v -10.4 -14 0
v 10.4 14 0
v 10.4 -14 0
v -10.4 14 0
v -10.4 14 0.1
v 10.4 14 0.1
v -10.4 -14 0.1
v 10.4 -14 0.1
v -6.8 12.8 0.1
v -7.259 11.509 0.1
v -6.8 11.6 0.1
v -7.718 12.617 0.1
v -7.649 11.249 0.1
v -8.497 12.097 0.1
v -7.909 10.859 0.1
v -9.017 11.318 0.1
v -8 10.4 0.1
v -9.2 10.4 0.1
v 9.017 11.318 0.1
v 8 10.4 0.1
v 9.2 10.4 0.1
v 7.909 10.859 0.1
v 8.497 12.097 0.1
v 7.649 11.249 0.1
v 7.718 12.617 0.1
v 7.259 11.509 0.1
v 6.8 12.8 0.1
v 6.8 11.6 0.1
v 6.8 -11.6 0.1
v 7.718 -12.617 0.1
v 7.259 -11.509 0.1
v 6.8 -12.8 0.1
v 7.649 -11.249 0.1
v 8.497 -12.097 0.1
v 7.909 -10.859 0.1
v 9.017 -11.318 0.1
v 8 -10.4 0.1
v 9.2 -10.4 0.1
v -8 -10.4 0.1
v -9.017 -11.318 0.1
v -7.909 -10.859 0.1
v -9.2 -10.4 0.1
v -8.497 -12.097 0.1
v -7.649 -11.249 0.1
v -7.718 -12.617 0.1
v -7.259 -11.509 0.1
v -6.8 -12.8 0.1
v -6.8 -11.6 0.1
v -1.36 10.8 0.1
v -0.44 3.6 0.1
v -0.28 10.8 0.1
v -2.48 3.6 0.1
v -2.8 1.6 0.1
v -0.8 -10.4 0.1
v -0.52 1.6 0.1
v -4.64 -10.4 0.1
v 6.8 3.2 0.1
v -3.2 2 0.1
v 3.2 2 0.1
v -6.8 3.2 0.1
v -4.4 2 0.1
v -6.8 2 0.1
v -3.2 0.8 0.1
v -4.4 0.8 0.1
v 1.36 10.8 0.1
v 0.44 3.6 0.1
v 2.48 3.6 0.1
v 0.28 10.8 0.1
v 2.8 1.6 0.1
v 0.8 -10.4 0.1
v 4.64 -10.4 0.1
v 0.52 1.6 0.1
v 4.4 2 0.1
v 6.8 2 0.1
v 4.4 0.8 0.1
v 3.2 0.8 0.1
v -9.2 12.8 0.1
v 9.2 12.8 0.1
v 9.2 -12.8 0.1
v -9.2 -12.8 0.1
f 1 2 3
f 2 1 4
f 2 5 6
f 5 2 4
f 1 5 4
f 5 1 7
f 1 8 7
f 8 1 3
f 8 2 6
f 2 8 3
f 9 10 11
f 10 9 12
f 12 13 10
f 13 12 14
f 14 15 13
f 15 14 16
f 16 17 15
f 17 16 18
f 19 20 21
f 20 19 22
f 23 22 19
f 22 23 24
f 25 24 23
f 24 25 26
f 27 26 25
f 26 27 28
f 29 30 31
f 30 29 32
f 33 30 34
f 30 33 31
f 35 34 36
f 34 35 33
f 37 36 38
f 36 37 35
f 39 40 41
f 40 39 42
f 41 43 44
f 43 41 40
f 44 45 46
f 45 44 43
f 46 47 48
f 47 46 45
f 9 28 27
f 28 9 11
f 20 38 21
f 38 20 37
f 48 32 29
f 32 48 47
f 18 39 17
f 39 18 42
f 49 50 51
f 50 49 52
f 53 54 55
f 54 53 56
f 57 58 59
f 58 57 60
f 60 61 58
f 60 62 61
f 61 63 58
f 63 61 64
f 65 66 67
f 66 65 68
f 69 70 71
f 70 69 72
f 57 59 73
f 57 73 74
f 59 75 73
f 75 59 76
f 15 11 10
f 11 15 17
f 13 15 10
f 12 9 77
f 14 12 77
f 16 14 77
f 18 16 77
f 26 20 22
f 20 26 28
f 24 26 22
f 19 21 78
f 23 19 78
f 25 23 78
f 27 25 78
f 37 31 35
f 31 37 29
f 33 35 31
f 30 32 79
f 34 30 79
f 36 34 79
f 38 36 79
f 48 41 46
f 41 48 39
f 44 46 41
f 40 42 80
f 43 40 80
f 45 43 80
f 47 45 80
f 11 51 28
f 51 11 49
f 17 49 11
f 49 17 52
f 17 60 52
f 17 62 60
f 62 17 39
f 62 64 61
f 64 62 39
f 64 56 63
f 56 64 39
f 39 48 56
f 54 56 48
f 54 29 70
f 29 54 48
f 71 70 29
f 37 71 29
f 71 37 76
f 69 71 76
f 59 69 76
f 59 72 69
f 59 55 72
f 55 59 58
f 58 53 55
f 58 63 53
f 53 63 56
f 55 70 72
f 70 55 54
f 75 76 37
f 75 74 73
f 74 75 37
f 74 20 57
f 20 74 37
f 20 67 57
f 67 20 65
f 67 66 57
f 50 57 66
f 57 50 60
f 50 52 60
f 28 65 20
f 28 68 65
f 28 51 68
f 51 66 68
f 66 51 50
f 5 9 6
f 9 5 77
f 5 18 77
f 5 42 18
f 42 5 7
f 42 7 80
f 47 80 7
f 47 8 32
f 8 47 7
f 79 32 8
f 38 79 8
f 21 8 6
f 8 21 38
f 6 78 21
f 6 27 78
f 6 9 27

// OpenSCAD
// file: ../p/1-4ndis.scad
use <../lib.scad>
function ldraw_lib__1_4ndis() = [
// 0 Disc Negative 0.25
// 0 Name: 1-4ndis.dat
// 0 Author: James Jessiman
// 0 !LDRAW_ORG Primitive UPDATE 2012-01
// 0 !LICENSE Licensed under CC BY 4.0 : see CAreadme.txt
// 
// 0 BFC CERTIFY CCW
  [0,"BFC","CERTIFY"],
  [0,"BFC","CCW"],
// 
// 0 !HISTORY 2002-03-23 [sbliss] Added BFC Statement
// 0 !HISTORY 2002-04-25 [PTadmin] Official Update 2002-02
// 0 !HISTORY 2007-06-22 [PTadmin] Header formatted for Contributor Agreement
// 0 !HISTORY 2008-07-01 [PTadmin] Official Update 2008-01
// 0 !HISTORY 2012-02-16 [Philo] Changed to CCW
// 0 !HISTORY 2012-03-30 [PTadmin] Official Update 2012-01
// 
// 
// 3 16 0.9239 0 0.3827 1 0 0 1 0 1
  [3,16,0.9239,0,0.3827,1,0,0,1,0,1],
// 3 16 0.7071 0 0.7071 0.9239 0 0.3827 1 0 1
  [3,16,0.7071,0,0.7071,0.9239,0,0.3827,1,0,1],
// 3 16 0.3827 0 0.9239 0.7071 0 0.7071 1 0 1
  [3,16,0.3827,0,0.9239,0.7071,0,0.7071,1,0,1],
// 3 16 0 0 1 0.3827 0 0.9239 1 0 1
  [3,16,0,0,1,0.3827,0,0.9239,1,0,1],
];
module ldraw_lib__1_4ndis(step=0, col=false, unit=2/5, alt=false, line=0.2, solid=!$preview)
    makepoly(ldraw_lib__1_4ndis(), step=step, col=col, unit=unit, alt=alt, line=line, solid=solid);
ldraw_lib__1_4ndis(line=0.2);
// file: ../p/1-4chrd.scad
use <../lib.scad>
function ldraw_lib__1_4chrd() = [
// 0 Chord 0.25
// 0 Name: 1-4chrd.dat
// 0 Author: Tony Hafner [hafhead]
// 0 !LDRAW_ORG Primitive UPDATE 2012-02
// 0 !LICENSE Licensed under CC BY 2.0 and CC BY 4.0 : see CAreadme.txt
// 
// 0 BFC CERTIFY CCW
  [0,"BFC","CERTIFY"],
  [0,"BFC","CCW"],
// 
// 0 !HISTORY 2004-04-22 [PTadmin] Official Update 2004-02
// 0 !HISTORY 2007-10-09 [PTadmin] Header formatted for Contributor Agreement
// 0 !HISTORY 2008-07-01 [PTadmin] Official Update 2008-01
// 0 !HISTORY 2012-08-02 [MMR1988] Re-creation with PrimGen2 and Rectifier
// 0 !HISTORY 2012-08-09 [PTadmin] Official Update 2012-02
// 
// 
// 4 16 0.9239 0 0.3827 0.3827 0 0.9239 0 0 1 1 0 0
  [4,16,0.9239,0,0.3827,0.3827,0,0.9239,0,0,1,1,0,0],
// 3 16 0.7071 0 0.7071 0.3827 0 0.9239 0.9239 0 0.3827
  [3,16,0.7071,0,0.7071,0.3827,0,0.9239,0.9239,0,0.3827],
];
module ldraw_lib__1_4chrd(step=0, col=false, unit=2/5, alt=false, line=0.2, solid=!$preview)
    makepoly(ldraw_lib__1_4chrd(), step=step, col=col, unit=unit, alt=alt, line=line, solid=solid);
ldraw_lib__1_4chrd(line=0.2);
// file: ../p/1-4ring1.scad
use <../lib.scad>
function ldraw_lib__1_4ring1() = [
// 0 Ring  1 x 0.25
// 0 Name: 1-4ring1.dat
// 0 Author: Chris Dee [cwdee]
// 0 !LDRAW_ORG Primitive UPDATE 2012-01
// 0 !LICENSE Licensed under CC BY 4.0 : see CAreadme.txt
// 
// 0 BFC CERTIFY CCW
  [0,"BFC","CERTIFY"],
  [0,"BFC","CCW"],
// 
// 0 !HISTORY 2000-05-07 [PTadmin] Official Update 2000-01
// 0 !HISTORY 2002-11-22 [hafhead] Added BFC statement
// 0 !HISTORY 2002-11-30 [PTadmin] Official Update 2002-05
// 0 !HISTORY 2007-06-22 [PTadmin] Header formatted for Contributor Agreement
// 0 !HISTORY 2008-07-01 [PTadmin] Official Update 2008-01
// 0 !HISTORY 2012-02-16 [Philo] Changed to CCW
// 0 !HISTORY 2012-03-30 [PTadmin] Official Update 2012-01
// 
// 
// 4 16 2 0 0 1.8478 0 0.7654 0.9239 0 0.3827 1 0 0
  [4,16,2,0,0,1.8478,0,0.7654,0.9239,0,0.3827,1,0,0],
// 4 16 1.8478 0 0.7654 1.4142 0 1.4142 0.7071 0 0.7071 0.9239 0 0.3827
  [4,16,1.8478,0,0.7654,1.4142,0,1.4142,0.7071,0,0.7071,0.9239,0,0.3827],
// 4 16 1.4142 0 1.4142 0.7654 0 1.8478 0.3827 0 0.9239 0.7071 0 0.7071
  [4,16,1.4142,0,1.4142,0.7654,0,1.8478,0.3827,0,0.9239,0.7071,0,0.7071],
// 4 16 0.7654 0 1.8478 0 0 2 0 0 1 0.3827 0 0.9239
  [4,16,0.7654,0,1.8478,0,0,2,0,0,1,0.3827,0,0.9239],
];
module ldraw_lib__1_4ring1(step=0, col=false, unit=2/5, alt=false, line=0.2, solid=!$preview)
    makepoly(ldraw_lib__1_4ring1(), step=step, col=col, unit=unit, alt=alt, line=line, solid=solid);
ldraw_lib__1_4ring1(line=0.2);
// file: s/194225bs02.scad
use <../../lib.scad>
use <../../p/1-4chrd.scad>
use <../../p/1-4ndis.scad>
function ldraw_lib__s__194225bs02() = [
// 0 ~Sticker  3.5 x  2.6 with White Motorway Logo - Background
// 0 Name: s\194225bs02.dat
// 0 Author: Takeshi Takahashi [RainbowDolphin]
// 0 !LDRAW_ORG Subpart UPDATE 2023-03
// 0 !LICENSE Licensed under CC BY 4.0 : see CAreadme.txt
// 
// 0 BFC CERTIFY CCW
  [0,"BFC","CERTIFY"],
  [0,"BFC","CCW"],
// 
// 0 !HISTORY 2023-06-24 [OrionP] Official Update 2023-03
// 
// 
// 1 16 -17 -0.25 26 0 0 -3 0 1 0 3 0 0 1-4chrd.dat
  [1,16,-17,-0.25,26,0,0,-3,0,1,0,3,0,0, ldraw_lib__1_4chrd()],
// 1 16 -17 -0.25 26 0 0 -6 0 1 0 6 0 0 1-4ndis.dat
  [1,16,-17,-0.25,26,0,0,-6,0,1,0,6,0,0, ldraw_lib__1_4ndis()],
// 1 16 17 -0.25 26 3 0 0 0 1 0 0 0 3 1-4chrd.dat
  [1,16,17,-0.25,26,3,0,0,0,1,0,0,0,3, ldraw_lib__1_4chrd()],
// 1 16 17 -0.25 26 6 0 0 0 1 0 0 0 6 1-4ndis.dat
  [1,16,17,-0.25,26,6,0,0,0,1,0,0,0,6, ldraw_lib__1_4ndis()],
// 1 16 17 -0.25 -26 0 0 3 0 1 0 -3 0 0 1-4chrd.dat
  [1,16,17,-0.25,-26,0,0,3,0,1,0,-3,0,0, ldraw_lib__1_4chrd()],
// 1 16 17 -0.25 -26 0 0 6 0 1 0 -6 0 0 1-4ndis.dat
  [1,16,17,-0.25,-26,0,0,6,0,1,0,-6,0,0, ldraw_lib__1_4ndis()],
// 1 16 -17 -0.25 -26 -3 0 0 0 1 0 0 0 -3 1-4chrd.dat
  [1,16,-17,-0.25,-26,-3,0,0,0,1,0,0,0,-3, ldraw_lib__1_4chrd()],
// 1 16 -17 -0.25 -26 -6 0 0 0 1 0 0 0 -6 1-4ndis.dat
  [1,16,-17,-0.25,-26,-6,0,0,0,1,0,0,0,-6, ldraw_lib__1_4ndis()],
// 4 16 -0.7 -0.25 27 17 -0.25 29 -17 -0.25 29 -3.4 -0.25 27
  [4,16,-0.7,-0.25,27,17,-0.25,29,-17,-0.25,29,-3.4,-0.25,27],
// 4 16 -3.4 -0.25 27 -17 -0.25 29 -20 -0.25 26 -6.2 -0.25 9
  [4,16,-3.4,-0.25,27,-17,-0.25,29,-20,-0.25,26,-6.2,-0.25,9],
// 3 16 -20 -0.25 26 -17 -0.25 8 -6.2 -0.25 9
  [3,16,-20,-0.25,26,-17,-0.25,8,-6.2,-0.25,9],
// 4 16 -17 -0.25 5 -17 -0.25 8 -20 -0.25 26 -20 -0.25 -26
  [4,16,-17,-0.25,5,-17,-0.25,8,-20,-0.25,26,-20,-0.25,-26],
// 4 16 -11 -0.25 5 -17 -0.25 5 -20 -0.25 -26 -11 -0.25 2
  [4,16,-11,-0.25,5,-17,-0.25,5,-20,-0.25,-26,-11,-0.25,2],
// 4 16 -8 -0.25 2 -11 -0.25 2 -20 -0.25 -26 -11.6 -0.25 -26
  [4,16,-8,-0.25,2,-11,-0.25,2,-20,-0.25,-26,-11.6,-0.25,-26],
// 3 16 -20 -0.25 -26 -17 -0.25 -29 -11.6 -0.25 -26
  [3,16,-20,-0.25,-26,-17,-0.25,-29,-11.6,-0.25,-26],
// 3 16 -2 -0.25 -26 -11.6 -0.25 -26 -17 -0.25 -29
  [3,16,-2,-0.25,-26,-11.6,-0.25,-26,-17,-0.25,-29],
// 4 16 2 -0.25 -26 -2 -0.25 -26 -17 -0.25 -29 17 -0.25 -29
  [4,16,2,-0.25,-26,-2,-0.25,-26,-17,-0.25,-29,17,-0.25,-29],
// 3 16 11.6 -0.25 -26 2 -0.25 -26 17 -0.25 -29
  [3,16,11.6,-0.25,-26,2,-0.25,-26,17,-0.25,-29],
// 4 16 11.6 -0.25 -26 17 -0.25 -29 20 -0.25 -26 8 -0.25 2
  [4,16,11.6,-0.25,-26,17,-0.25,-29,20,-0.25,-26,8,-0.25,2],
// 3 16 7 -0.25 4 11.6 -0.25 -26 8 -0.25 2
  [3,16,7,-0.25,4,11.6,-0.25,-26,8,-0.25,2],
// 3 16 8 -0.25 5 7 -0.25 4 8 -0.25 2
  [3,16,8,-0.25,5,7,-0.25,4,8,-0.25,2],
// 3 16 8 -0.25 5 1.3 -0.25 4 7 -0.25 4
  [3,16,8,-0.25,5,1.3,-0.25,4,7,-0.25,4],
// 4 16 -1.3 -0.25 4 1.3 -0.25 4 8 -0.25 5 -8 -0.25 5
  [4,16,-1.3,-0.25,4,1.3,-0.25,4,8,-0.25,5,-8,-0.25,5],
// 3 16 -8 -0.25 5 -7 -0.25 4 -1.3 -0.25 4
  [3,16,-8,-0.25,5,-7,-0.25,4,-1.3,-0.25,4],
// 3 16 -8 -0.25 5 -8 -0.25 2 -7 -0.25 4
  [3,16,-8,-0.25,5,-8,-0.25,2,-7,-0.25,4],
// 3 16 -7 -0.25 4 -8 -0.25 2 -11.6 -0.25 -26
  [3,16,-7,-0.25,4,-8,-0.25,2,-11.6,-0.25,-26],
// 4 16 1.3 -0.25 4 -1.3 -0.25 4 -2 -0.25 -26 2 -0.25 -26
  [4,16,1.3,-0.25,4,-1.3,-0.25,4,-2,-0.25,-26,2,-0.25,-26],
// 3 16 11 -0.25 2 8 -0.25 2 20 -0.25 -26
  [3,16,11,-0.25,2,8,-0.25,2,20,-0.25,-26],
// 4 16 11 -0.25 5 11 -0.25 2 20 -0.25 -26 17 -0.25 5
  [4,16,11,-0.25,5,11,-0.25,2,20,-0.25,-26,17,-0.25,5],
// 4 16 17 -0.25 5 20 -0.25 -26 20 -0.25 26 17 -0.25 8
  [4,16,17,-0.25,5,20,-0.25,-26,20,-0.25,26,17,-0.25,8],
// 4 16 6.2 -0.25 9 17 -0.25 8 20 -0.25 26 3.4 -0.25 27
  [4,16,6.2,-0.25,9,17,-0.25,8,20,-0.25,26,3.4,-0.25,27],
// 3 16 6.2 -0.25 9 1.1 -0.25 9 17 -0.25 8
  [3,16,6.2,-0.25,9,1.1,-0.25,9,17,-0.25,8],
// 4 16 17 -0.25 8 1.1 -0.25 9 -1.1 -0.25 9 -17 -0.25 8
  [4,16,17,-0.25,8,1.1,-0.25,9,-1.1,-0.25,9,-17,-0.25,8],
// 3 16 -1.1 -0.25 9 -6.2 -0.25 9 -17 -0.25 8
  [3,16,-1.1,-0.25,9,-6.2,-0.25,9,-17,-0.25,8],
// 3 16 17 -0.25 29 3.4 -0.25 27 20 -0.25 26
  [3,16,17,-0.25,29,3.4,-0.25,27,20,-0.25,26],
// 3 16 17 -0.25 29 0.7 -0.25 27 3.4 -0.25 27
  [3,16,17,-0.25,29,0.7,-0.25,27,3.4,-0.25,27],
// 3 16 17 -0.25 29 -0.7 -0.25 27 0.7 -0.25 27
  [3,16,17,-0.25,29,-0.7,-0.25,27,0.7,-0.25,27],
// 4 16 0.7 -0.25 27 -0.7 -0.25 27 -1.1 -0.25 9 1.1 -0.25 9
  [4,16,0.7,-0.25,27,-0.7,-0.25,27,-1.1,-0.25,9,1.1,-0.25,9],
// 4 16 -17 -0.25 32 26 -0.25 35 -26 -0.25 35 -23 -0.25 32
  [4,16,-17,-0.25,32,26,-0.25,35,-26,-0.25,35,-23,-0.25,32],
// 3 16 -26 -0.25 35 -23 -0.25 26 -23 -0.25 32
  [3,16,-26,-0.25,35,-23,-0.25,26,-23,-0.25,32],
// 4 16 -23 -0.25 -26 -23 -0.25 26 -26 -0.25 35 -26 -0.25 -35
  [4,16,-23,-0.25,-26,-23,-0.25,26,-26,-0.25,35,-26,-0.25,-35],
// 3 16 -23 -0.25 -26 -26 -0.25 -35 -23 -0.25 -32
  [3,16,-23,-0.25,-26,-26,-0.25,-35,-23,-0.25,-32],
// 3 16 -17 -0.25 -32 -23 -0.25 -32 -26 -0.25 -35
  [3,16,-17,-0.25,-32,-23,-0.25,-32,-26,-0.25,-35],
// 4 16 17 -0.25 -32 -17 -0.25 -32 -26 -0.25 -35 26 -0.25 -35
  [4,16,17,-0.25,-32,-17,-0.25,-32,-26,-0.25,-35,26,-0.25,-35],
// 3 16 23 -0.25 -32 17 -0.25 -32 26 -0.25 -35
  [3,16,23,-0.25,-32,17,-0.25,-32,26,-0.25,-35],
// 3 16 23 -0.25 -26 23 -0.25 -32 26 -0.25 -35
  [3,16,23,-0.25,-26,23,-0.25,-32,26,-0.25,-35],
// 4 16 23 -0.25 26 23 -0.25 -26 26 -0.25 -35 26 -0.25 35
  [4,16,23,-0.25,26,23,-0.25,-26,26,-0.25,-35,26,-0.25,35],
// 3 16 26 -0.25 35 23 -0.25 32 23 -0.25 26
  [3,16,26,-0.25,35,23,-0.25,32,23,-0.25,26],
// 3 16 26 -0.25 35 17 -0.25 32 23 -0.25 32
  [3,16,26,-0.25,35,17,-0.25,32,23,-0.25,32],
// 3 16 26 -0.25 35 -17 -0.25 32 17 -0.25 32
  [3,16,26,-0.25,35,-17,-0.25,32,17,-0.25,32],
];
module ldraw_lib__s__194225bs02(step=0, col=false, unit=2/5, alt=false, line=0.2, solid=!$preview)
    makepoly(ldraw_lib__s__194225bs02(), step=step, col=col, unit=unit, alt=alt, line=line, solid=solid);
ldraw_lib__s__194225bs02(line=0.2);
// file: s/194225bs01.scad
use <../../lib.scad>
use <../../p/1-4ring1.scad>
function ldraw_lib__s__194225bs01() = [
// 0 ~Sticker  3.5 x  2.6 with White Motorway Logo - Foreground
// 0 Name: s\194225bs01.dat
// 0 Author: Takeshi Takahashi [RainbowDolphin]
// 0 !LDRAW_ORG Subpart UPDATE 2023-03
// 0 !LICENSE Licensed under CC BY 4.0 : see CAreadme.txt
// 
// 0 BFC CERTIFY CCW
  [0,"BFC","CERTIFY"],
  [0,"BFC","CCW"],
// 
// 0 !HISTORY 2023-06-24 [OrionP] Official Update 2023-03
// 
// 
// 1 15 -17 -0.25 26 0 0 -3 0 1 0 3 0 0 1-4ring1.dat
  [1,15,-17,-0.25,26,0,0,-3,0,1,0,3,0,0, ldraw_lib__1_4ring1()],
// 1 15 17 -0.25 26 3 0 0 0 1 0 0 0 3 1-4ring1.dat
  [1,15,17,-0.25,26,3,0,0,0,1,0,0,0,3, ldraw_lib__1_4ring1()],
// 1 15 17 -0.25 -26 0 0 3 0 1 0 -3 0 0 1-4ring1.dat
  [1,15,17,-0.25,-26,0,0,3,0,1,0,-3,0,0, ldraw_lib__1_4ring1()],
// 1 15 -17 -0.25 -26 -3 0 0 0 1 0 0 0 -3 1-4ring1.dat
  [1,15,-17,-0.25,-26,-3,0,0,0,1,0,0,0,-3, ldraw_lib__1_4ring1()],
// 4 15 17 -0.25 32 -17 -0.25 32 -17 -0.25 29 17 -0.25 29
  [4,15,17,-0.25,32,-17,-0.25,32,-17,-0.25,29,17,-0.25,29],
// 4 15 23 -0.25 26 20 -0.25 26 20 -0.25 -26 23 -0.25 -26
  [4,15,23,-0.25,26,20,-0.25,26,20,-0.25,-26,23,-0.25,-26],
// 4 15 17 -0.25 -29 -17 -0.25 -29 -17 -0.25 -32 17 -0.25 -32
  [4,15,17,-0.25,-29,-17,-0.25,-29,-17,-0.25,-32,17,-0.25,-32],
// 4 15 -23 -0.25 -26 -20 -0.25 -26 -20 -0.25 26 -23 -0.25 26
  [4,15,-23,-0.25,-26,-20,-0.25,-26,-20,-0.25,26,-23,-0.25,26],
// 4 15 -1.1 -0.25 9 -0.7 -0.25 27 -3.4 -0.25 27 -6.2 -0.25 9
  [4,15,-1.1,-0.25,9,-0.7,-0.25,27,-3.4,-0.25,27,-6.2,-0.25,9],
// 4 15 -11.6 -0.25 -26 -2 -0.25 -26 -1.3 -0.25 4 -7 -0.25 4
  [4,15,-11.6,-0.25,-26,-2,-0.25,-26,-1.3,-0.25,4,-7,-0.25,4],
// 4 15 8 -0.25 5 17 -0.25 8 -17 -0.25 8 -8 -0.25 5
  [4,15,8,-0.25,5,17,-0.25,8,-17,-0.25,8,-8,-0.25,5],
// 3 15 -17 -0.25 8 -11 -0.25 5 -8 -0.25 5
  [3,15,-17,-0.25,8,-11,-0.25,5,-8,-0.25,5],
// 3 15 -17 -0.25 8 -17 -0.25 5 -11 -0.25 5
  [3,15,-17,-0.25,8,-17,-0.25,5,-11,-0.25,5],
// 4 15 -8 -0.25 5 -11 -0.25 5 -11 -0.25 2 -8 -0.25 2
  [4,15,-8,-0.25,5,-11,-0.25,5,-11,-0.25,2,-8,-0.25,2],
// 4 15 3.4 -0.25 27 0.7 -0.25 27 1.1 -0.25 9 6.2 -0.25 9
  [4,15,3.4,-0.25,27,0.7,-0.25,27,1.1,-0.25,9,6.2,-0.25,9],
// 4 15 1.3 -0.25 4 2 -0.25 -26 11.6 -0.25 -26 7 -0.25 4
  [4,15,1.3,-0.25,4,2,-0.25,-26,11.6,-0.25,-26,7,-0.25,4],
// 3 15 17 -0.25 8 8 -0.25 5 11 -0.25 5
  [3,15,17,-0.25,8,8,-0.25,5,11,-0.25,5],
// 3 15 17 -0.25 8 11 -0.25 5 17 -0.25 5
  [3,15,17,-0.25,8,11,-0.25,5,17,-0.25,5],
// 4 15 11 -0.25 2 11 -0.25 5 8 -0.25 5 8 -0.25 2
  [4,15,11,-0.25,2,11,-0.25,5,8,-0.25,5,8,-0.25,2],
];
module ldraw_lib__s__194225bs01(step=0, col=false, unit=2/5, alt=false, line=0.2, solid=!$preview)
    makepoly(ldraw_lib__s__194225bs01(), step=step, col=col, unit=unit, alt=alt, line=line, solid=solid);
ldraw_lib__s__194225bs01(line=0.2);
// file: ../p/box5-12.scad
use <../lib.scad>
function ldraw_lib__box5_12() = [
// 0 Box with 5 Faces without Any Edges
// 0 Name: box5-12.dat
// 0 Author: Chris Dee [cwdee]
// 0 !LDRAW_ORG Primitive UPDATE 2009-02
// 0 !LICENSE Licensed under CC BY 4.0 : see CAreadme.txt
// 
// 0 BFC CERTIFY CCW
  [0,"BFC","CERTIFY"],
  [0,"BFC","CCW"],
// 
// 0 !HISTORY 2009-09-03 [PTadmin] Official Update 2009-02
// 
// 
// 4 16 1 1 1 1 1 -1 -1 1 -1 -1 1 1
  [4,16,1,1,1,1,1,-1,-1,1,-1,-1,1,1],
// 4 16 -1 0 1 1 0 1 1 1 1 -1 1 1
  [4,16,-1,0,1,1,0,1,1,1,1,-1,1,1],
// 4 16 -1 0 -1 -1 0 1 -1 1 1 -1 1 -1
  [4,16,-1,0,-1,-1,0,1,-1,1,1,-1,1,-1],
// 4 16 1 0 -1 -1 0 -1 -1 1 -1 1 1 -1
  [4,16,1,0,-1,-1,0,-1,-1,1,-1,1,1,-1],
// 4 16 1 0 1 1 0 -1 1 1 -1 1 1 1
  [4,16,1,0,1,1,0,-1,1,1,-1,1,1,1],
// 0
];
module ldraw_lib__box5_12(step=0, col=false, unit=2/5, alt=false, line=0.2, solid=!$preview)
    makepoly(ldraw_lib__box5_12(), step=step, col=col, unit=unit, alt=alt, line=line, solid=solid);
ldraw_lib__box5_12(line=0.2);
// main file
use <../lib.scad>
use <../p/box5-12.scad>
use <s/194225bs01.scad>
use <s/194225bs02.scad>
function ldraw_lib__194225c() = [
// 0 Sticker  3.5 x  2.6 with White Motorway Logo on Green Background
// 0 Name: 194225c.dat
// 0 Author: Takeshi Takahashi [RainbowDolphin]
// 0 !LDRAW_ORG Part UPDATE 2023-03
// 0 !LICENSE Licensed under CC BY 4.0 : see CAreadme.txt
// 
// 0 BFC CERTIFY CCW
  [0,"BFC","CERTIFY"],
  [0,"BFC","CCW"],
// 
// 0 !KEYWORDS Freeway, Highway, Road maintenance, Set 6653
// 
// 0 !HISTORY 2023-06-24 [OrionP] Official Update 2023-03
// 
// 
// 1 16 0 -0.25 0 26 0 0 0 0.25 0 0 0 35 box5-12.dat
  [1,16,0,-0.25,0,26,0,0,0,0.25,0,0,0,35, ldraw_lib__box5_12()],
// 1 15 0 0 0 1 0 0 0 1 0 0 0 1 s\194225bs01.dat
  [1,15,0,0,0,1,0,0,0,1,0,0,0,1, ldraw_lib__s__194225bs01()],
// 1 2 0 0 0 1 0 0 0 1 0 0 0 1 s\194225bs02.dat
  [1,2,0,0,0,1,0,0,0,1,0,0,0,1, ldraw_lib__s__194225bs02()],
];
module ldraw_lib__194225c(step=0, col=false, unit=2/5, alt=false, line=0.2, solid=!$preview)
    makepoly(ldraw_lib__194225c(), step=step, col=col, unit=unit, alt=alt, line=line, solid=solid);
ldraw_lib__194225c(line=0.2);
